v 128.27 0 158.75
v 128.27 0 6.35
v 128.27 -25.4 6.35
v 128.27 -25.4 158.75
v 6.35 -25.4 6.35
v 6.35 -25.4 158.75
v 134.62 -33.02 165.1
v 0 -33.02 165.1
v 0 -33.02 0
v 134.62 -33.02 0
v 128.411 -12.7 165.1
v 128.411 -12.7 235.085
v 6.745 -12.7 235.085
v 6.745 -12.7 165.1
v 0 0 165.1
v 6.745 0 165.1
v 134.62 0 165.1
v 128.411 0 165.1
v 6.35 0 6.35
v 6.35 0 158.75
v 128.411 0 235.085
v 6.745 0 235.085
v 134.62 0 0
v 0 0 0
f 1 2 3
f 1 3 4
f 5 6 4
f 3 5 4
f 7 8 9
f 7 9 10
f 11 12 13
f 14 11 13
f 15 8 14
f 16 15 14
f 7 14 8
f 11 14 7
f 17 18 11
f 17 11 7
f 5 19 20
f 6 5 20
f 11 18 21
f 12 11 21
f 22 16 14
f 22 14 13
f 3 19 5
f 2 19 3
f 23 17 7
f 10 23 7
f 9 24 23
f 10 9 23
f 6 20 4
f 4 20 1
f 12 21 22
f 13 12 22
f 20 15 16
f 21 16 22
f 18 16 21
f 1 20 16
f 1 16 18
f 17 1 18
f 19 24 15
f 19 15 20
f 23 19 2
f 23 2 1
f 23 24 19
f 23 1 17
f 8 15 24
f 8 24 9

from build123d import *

# Parameters (mm, degrees)
F0_W     = 134.62
F0_H     = 165.1
F0_W_2   = 121.92
F0_H_2   = 152.4
F1_DEPTH = 33.02
F2_W     = 121.92
F2_H     = 152.4
F4_DEPTH = 7.62
F5_W     = 121.666
F5_H     = 69.9852703571
F6_DEPTH = 12.7
F7_DEPTH = 5.08
F8_DEPTH = 3.81


with BuildPart() as f1:
    # F0 (on Front) → F1 (new body)
    with BuildSketch(Plane.XZ):
        with Locations((67.31, 82.55)):
            Rectangle(F0_W, F0_H)
        with Locations((67.31, 82.55)):
            Rectangle(F0_W_2, F0_H_2, mode=Mode.SUBTRACT)
    extrude(amount=F1_DEPTH)

    # F2 (on face) → F4 (join)
    with BuildSketch(Plane.XZ.offset(33.02)):
        with Locations((67.31, 82.55)):
            Rectangle(F2_W, F2_H)
    extrude(amount=-F4_DEPTH)

    # F5 (on face) → F6 (join)
    with BuildSketch(Plane(origin=(0, 0, 0), x_dir=(-1, 0, 0), z_dir=(0, 1, 0))):
        with Locations((-67.5779950066, 200.0926351786)):
            Rectangle(F5_W, F5_H)
    extrude(amount=-F6_DEPTH)

    # F7 (add): a face of the model
    f7_faces = [f1.faces().sort_by_distance(p)[0] for p in [
        (67.31, -16.51, 0),
    ]]
    extrude(f7_faces, amount=-F7_DEPTH)

    # F8 (add): a face of the model
    f8_faces = [f1.faces().sort_by_distance(p)[0] for p in [
        (67.31, -16.51, 0),
    ]]
    extrude(f8_faces, amount=-F8_DEPTH)


solid = f1.part
